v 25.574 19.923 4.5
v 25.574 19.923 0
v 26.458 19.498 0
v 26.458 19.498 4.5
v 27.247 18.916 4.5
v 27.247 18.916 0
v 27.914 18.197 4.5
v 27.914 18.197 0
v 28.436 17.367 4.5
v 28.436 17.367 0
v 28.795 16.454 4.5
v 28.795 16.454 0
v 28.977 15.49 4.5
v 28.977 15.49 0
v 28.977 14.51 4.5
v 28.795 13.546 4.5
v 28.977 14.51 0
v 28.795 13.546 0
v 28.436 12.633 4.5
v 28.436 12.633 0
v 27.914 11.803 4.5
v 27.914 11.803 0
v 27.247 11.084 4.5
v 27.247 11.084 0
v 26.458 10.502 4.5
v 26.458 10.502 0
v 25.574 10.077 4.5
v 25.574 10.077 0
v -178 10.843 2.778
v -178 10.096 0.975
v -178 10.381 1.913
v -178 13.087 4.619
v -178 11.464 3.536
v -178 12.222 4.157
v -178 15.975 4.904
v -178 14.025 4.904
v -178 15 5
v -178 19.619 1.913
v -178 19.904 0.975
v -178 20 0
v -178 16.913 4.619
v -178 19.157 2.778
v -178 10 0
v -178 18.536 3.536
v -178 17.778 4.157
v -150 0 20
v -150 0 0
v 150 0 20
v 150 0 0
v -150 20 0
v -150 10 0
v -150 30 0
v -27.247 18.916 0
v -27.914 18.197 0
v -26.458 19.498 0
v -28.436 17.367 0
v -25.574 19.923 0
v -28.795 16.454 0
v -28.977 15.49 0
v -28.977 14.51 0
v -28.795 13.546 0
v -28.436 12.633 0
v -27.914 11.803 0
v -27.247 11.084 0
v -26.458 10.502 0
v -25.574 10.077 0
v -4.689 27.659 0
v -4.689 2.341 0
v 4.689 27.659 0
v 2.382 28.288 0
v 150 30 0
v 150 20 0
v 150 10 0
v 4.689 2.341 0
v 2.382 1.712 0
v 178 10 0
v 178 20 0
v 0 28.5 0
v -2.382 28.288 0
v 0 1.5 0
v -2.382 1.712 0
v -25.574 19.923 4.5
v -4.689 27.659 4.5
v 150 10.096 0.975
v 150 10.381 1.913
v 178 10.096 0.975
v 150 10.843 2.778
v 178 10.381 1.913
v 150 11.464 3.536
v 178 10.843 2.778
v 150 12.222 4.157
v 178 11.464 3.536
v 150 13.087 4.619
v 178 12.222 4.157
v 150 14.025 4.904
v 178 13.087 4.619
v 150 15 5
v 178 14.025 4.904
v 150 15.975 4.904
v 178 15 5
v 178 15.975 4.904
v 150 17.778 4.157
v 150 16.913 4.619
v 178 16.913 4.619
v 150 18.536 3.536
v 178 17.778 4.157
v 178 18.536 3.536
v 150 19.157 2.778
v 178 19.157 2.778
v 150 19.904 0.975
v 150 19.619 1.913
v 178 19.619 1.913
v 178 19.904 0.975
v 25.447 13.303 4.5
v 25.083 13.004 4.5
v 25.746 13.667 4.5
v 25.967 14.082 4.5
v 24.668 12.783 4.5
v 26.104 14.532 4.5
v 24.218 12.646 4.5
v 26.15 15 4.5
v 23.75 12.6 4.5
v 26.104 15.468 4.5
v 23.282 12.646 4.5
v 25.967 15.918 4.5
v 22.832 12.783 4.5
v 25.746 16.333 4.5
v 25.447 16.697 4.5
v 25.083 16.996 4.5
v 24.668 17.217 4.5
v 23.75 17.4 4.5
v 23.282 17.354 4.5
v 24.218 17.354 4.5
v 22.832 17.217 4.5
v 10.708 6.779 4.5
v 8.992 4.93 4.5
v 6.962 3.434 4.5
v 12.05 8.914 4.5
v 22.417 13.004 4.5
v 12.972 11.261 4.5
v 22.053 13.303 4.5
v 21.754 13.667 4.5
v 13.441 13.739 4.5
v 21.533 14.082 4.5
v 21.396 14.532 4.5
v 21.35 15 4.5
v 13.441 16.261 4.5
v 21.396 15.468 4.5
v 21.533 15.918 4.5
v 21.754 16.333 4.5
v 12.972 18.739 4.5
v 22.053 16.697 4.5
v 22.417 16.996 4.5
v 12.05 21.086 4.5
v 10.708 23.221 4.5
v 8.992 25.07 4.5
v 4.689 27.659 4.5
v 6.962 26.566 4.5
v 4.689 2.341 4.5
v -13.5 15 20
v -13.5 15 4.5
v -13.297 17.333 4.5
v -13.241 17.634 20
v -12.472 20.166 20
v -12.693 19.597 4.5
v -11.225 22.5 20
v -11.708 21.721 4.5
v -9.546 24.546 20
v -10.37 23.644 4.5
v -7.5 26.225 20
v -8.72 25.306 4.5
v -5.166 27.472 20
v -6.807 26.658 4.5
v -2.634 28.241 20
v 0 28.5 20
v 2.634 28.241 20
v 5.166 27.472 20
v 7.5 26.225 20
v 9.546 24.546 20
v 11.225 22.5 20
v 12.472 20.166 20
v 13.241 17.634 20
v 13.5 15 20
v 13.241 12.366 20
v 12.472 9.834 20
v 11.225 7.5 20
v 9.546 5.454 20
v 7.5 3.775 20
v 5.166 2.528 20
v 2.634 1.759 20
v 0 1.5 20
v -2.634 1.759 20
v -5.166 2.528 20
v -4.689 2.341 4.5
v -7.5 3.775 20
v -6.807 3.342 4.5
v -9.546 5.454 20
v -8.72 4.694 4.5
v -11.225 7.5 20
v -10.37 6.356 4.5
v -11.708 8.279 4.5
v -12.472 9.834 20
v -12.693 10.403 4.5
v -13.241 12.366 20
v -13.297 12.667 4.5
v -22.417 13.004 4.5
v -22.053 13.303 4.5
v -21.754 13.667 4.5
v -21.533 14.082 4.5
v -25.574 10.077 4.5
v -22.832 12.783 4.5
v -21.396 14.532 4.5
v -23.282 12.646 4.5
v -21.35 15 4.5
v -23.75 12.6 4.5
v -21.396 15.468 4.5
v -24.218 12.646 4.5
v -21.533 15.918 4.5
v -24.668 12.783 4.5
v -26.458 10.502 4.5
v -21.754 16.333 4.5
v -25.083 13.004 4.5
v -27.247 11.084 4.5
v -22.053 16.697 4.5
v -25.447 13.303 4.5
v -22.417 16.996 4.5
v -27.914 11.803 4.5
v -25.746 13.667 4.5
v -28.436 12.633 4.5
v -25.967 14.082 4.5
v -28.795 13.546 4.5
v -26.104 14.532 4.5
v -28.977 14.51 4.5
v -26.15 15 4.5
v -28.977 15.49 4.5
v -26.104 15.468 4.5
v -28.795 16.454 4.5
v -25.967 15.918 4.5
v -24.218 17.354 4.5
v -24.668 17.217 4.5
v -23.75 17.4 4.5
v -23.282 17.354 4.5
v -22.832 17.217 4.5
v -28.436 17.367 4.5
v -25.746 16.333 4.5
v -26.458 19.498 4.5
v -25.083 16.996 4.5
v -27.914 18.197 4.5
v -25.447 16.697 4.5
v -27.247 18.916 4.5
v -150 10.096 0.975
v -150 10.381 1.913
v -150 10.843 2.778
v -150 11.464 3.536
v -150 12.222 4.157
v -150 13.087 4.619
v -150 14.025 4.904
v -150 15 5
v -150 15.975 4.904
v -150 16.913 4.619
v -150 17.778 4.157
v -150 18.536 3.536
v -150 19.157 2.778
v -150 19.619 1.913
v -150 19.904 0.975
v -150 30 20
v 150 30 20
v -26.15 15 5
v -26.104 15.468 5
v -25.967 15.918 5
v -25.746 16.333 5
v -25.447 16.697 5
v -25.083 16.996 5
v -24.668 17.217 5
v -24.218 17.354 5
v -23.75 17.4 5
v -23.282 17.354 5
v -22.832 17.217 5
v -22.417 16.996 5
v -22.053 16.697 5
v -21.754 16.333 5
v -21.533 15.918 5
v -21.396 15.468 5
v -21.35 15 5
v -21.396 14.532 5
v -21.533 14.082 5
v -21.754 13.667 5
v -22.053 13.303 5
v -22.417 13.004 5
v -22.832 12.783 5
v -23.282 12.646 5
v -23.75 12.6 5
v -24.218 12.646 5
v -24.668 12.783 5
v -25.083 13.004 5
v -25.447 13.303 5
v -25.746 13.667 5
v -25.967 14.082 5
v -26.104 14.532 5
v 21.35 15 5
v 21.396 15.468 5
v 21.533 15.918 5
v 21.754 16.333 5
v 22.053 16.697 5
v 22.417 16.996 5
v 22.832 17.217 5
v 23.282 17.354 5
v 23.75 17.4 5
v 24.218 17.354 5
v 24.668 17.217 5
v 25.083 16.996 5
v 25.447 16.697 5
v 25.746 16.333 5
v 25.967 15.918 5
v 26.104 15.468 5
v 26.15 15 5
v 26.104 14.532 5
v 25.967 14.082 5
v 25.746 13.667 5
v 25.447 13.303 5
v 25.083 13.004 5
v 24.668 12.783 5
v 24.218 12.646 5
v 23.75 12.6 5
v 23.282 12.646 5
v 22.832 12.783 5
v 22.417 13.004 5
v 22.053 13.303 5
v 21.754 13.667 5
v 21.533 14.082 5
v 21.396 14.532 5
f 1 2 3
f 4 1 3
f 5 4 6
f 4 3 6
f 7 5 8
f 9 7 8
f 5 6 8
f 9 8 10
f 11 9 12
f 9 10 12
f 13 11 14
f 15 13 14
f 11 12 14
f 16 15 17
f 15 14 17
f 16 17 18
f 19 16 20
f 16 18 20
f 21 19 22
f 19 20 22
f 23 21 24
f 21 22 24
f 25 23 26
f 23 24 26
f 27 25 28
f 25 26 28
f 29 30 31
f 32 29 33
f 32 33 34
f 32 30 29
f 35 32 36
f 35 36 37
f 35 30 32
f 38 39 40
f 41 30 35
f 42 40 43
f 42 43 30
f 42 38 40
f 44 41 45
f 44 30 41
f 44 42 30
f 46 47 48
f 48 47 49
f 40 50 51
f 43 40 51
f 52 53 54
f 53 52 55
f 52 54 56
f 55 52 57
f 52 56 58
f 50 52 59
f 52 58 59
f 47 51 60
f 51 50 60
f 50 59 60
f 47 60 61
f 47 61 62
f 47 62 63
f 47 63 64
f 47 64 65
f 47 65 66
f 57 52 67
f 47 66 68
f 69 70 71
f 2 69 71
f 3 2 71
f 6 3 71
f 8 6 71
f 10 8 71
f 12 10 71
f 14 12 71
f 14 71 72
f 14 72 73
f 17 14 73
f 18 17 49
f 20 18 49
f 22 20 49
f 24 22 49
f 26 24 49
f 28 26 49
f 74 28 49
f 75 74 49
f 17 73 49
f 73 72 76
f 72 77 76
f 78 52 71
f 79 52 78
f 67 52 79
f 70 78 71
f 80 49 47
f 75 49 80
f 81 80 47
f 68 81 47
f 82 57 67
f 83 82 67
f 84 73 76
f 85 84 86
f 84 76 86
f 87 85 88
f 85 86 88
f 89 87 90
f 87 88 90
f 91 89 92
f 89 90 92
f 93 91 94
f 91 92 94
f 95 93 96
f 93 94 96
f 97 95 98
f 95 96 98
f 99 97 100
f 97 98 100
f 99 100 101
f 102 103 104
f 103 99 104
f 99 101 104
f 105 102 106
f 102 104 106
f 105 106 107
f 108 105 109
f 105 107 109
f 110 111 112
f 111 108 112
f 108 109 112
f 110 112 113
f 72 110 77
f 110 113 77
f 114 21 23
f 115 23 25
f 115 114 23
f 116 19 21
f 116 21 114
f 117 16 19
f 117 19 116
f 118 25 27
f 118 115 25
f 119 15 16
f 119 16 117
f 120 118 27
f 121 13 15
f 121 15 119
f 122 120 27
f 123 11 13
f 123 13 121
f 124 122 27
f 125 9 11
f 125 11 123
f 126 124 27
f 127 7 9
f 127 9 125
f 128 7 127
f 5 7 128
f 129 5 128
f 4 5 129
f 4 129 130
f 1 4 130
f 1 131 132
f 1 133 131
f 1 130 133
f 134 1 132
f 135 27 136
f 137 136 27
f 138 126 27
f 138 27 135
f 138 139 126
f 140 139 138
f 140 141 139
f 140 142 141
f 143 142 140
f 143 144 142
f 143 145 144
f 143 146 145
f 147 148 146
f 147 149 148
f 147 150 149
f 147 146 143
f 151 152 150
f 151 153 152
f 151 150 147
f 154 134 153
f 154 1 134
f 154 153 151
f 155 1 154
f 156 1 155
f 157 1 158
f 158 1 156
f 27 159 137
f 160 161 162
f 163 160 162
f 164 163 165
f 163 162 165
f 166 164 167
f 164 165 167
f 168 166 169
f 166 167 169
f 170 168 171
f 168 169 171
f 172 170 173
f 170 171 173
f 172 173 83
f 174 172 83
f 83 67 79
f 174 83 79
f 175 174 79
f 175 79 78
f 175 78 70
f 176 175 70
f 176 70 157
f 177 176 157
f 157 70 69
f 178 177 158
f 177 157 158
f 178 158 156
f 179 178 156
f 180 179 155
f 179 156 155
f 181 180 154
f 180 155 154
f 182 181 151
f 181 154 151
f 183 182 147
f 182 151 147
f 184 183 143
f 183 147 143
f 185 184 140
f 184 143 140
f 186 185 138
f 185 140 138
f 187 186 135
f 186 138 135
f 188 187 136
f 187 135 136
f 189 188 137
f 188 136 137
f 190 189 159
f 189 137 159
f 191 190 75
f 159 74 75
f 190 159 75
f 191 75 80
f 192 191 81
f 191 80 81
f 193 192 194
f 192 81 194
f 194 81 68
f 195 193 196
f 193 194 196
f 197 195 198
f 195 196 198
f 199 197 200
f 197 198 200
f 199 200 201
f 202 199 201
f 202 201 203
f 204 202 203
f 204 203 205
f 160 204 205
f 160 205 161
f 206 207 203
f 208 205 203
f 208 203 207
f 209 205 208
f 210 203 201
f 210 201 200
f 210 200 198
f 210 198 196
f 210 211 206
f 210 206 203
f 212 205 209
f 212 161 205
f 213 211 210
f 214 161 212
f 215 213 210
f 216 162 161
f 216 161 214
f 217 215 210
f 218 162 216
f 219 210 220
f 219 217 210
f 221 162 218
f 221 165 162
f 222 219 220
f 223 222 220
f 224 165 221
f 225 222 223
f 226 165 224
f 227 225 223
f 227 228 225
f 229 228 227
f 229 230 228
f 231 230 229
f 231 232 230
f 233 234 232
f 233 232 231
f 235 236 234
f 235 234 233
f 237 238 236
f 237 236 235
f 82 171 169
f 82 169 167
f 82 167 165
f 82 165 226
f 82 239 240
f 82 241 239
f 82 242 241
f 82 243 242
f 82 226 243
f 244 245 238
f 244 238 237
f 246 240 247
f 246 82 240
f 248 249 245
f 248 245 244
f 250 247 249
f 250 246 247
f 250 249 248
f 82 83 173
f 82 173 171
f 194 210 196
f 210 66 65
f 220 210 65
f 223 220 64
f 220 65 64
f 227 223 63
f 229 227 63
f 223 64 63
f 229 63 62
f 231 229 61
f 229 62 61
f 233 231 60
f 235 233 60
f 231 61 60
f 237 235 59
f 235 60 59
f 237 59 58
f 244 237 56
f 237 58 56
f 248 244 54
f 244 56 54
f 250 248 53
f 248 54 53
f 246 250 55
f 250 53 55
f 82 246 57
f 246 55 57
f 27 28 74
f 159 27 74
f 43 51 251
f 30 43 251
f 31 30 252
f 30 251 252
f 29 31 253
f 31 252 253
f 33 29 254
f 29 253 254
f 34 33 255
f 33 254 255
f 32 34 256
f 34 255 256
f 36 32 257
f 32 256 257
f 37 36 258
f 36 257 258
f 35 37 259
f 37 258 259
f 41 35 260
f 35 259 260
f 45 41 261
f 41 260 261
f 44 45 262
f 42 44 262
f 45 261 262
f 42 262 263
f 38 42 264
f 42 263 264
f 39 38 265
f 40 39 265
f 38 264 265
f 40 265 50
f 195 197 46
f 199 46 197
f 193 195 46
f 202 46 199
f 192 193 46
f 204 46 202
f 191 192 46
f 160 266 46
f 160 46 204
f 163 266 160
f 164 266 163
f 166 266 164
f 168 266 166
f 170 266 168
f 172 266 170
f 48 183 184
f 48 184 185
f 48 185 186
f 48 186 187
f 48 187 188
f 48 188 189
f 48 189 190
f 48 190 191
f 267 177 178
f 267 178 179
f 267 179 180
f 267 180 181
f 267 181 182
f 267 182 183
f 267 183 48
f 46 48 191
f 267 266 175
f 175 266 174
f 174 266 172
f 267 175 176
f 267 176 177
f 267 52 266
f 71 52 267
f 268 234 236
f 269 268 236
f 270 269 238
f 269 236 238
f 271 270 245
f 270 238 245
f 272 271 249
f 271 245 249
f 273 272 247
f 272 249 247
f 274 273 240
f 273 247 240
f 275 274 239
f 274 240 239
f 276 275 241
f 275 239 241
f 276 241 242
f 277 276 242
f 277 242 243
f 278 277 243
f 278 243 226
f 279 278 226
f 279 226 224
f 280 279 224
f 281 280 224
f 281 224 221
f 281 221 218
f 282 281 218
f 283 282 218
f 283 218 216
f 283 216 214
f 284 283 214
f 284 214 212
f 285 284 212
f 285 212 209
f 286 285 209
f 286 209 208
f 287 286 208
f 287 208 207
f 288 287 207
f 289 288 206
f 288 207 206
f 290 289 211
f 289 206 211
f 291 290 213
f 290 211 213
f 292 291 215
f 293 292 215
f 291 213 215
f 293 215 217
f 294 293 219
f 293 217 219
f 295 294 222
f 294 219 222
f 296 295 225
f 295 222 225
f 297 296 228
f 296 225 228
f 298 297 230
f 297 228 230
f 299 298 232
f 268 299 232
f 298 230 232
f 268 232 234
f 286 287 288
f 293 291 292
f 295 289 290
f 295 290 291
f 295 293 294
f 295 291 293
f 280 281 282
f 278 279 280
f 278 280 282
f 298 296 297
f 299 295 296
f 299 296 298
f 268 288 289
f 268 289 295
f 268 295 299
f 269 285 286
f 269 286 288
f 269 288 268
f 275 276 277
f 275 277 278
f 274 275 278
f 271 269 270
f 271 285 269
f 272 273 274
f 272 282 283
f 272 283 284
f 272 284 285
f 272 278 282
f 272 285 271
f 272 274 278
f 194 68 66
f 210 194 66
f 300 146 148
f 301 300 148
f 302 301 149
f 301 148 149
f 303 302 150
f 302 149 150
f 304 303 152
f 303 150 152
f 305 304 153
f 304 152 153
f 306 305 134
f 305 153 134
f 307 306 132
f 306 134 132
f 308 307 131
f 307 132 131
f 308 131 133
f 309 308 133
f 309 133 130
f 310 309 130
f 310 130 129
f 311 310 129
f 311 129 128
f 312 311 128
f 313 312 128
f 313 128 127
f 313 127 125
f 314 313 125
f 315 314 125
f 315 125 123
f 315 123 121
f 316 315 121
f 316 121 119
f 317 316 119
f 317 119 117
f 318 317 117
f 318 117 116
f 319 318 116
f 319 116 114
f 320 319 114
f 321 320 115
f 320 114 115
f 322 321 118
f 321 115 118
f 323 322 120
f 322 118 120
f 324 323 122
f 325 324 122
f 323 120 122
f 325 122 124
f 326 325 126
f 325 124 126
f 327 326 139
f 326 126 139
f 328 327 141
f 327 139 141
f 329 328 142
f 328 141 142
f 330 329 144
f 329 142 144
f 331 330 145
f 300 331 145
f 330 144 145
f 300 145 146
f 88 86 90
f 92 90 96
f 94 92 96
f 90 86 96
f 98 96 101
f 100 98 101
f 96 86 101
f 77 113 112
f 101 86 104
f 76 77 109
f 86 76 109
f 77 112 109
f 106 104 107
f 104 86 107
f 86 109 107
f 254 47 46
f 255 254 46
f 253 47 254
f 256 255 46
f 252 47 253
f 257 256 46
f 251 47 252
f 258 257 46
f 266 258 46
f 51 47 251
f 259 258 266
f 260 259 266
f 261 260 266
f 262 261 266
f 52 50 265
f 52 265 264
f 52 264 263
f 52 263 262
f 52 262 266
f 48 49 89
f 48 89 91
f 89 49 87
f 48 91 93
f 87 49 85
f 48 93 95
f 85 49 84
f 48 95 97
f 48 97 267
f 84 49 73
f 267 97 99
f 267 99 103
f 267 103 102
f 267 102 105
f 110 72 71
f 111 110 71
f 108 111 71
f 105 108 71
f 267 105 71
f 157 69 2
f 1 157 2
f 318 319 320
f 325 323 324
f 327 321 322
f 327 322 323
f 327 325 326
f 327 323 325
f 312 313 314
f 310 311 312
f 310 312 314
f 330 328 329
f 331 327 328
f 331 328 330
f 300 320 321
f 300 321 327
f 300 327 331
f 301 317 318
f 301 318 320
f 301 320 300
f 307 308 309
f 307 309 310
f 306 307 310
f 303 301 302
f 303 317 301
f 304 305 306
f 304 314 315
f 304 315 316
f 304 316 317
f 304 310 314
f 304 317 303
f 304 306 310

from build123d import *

# Parameters (mm, degrees)
SKETCH_1_W           = 300
SKETCH_1_H           = 30
EXTRUDE_1_DEPTH      = 20
EXTRUDE_2_DEPTH      = 28
EXTRUDE_2_DEPTH_BACK = 328
SKETCH_3_R           = 13.5
CUT_EXTRUDE_2_DEPTH  = 182.614977356
SKETCH_3_4_R         = 2.4
CUT_EXTRUDE_3_DEPTH  = 4.5
SKETCH_3_5_R         = 2.4
CUT_EXTRUDE_4_DEPTH  = 5


with BuildPart() as part:
    # 草图1 → 凸台-拉伸1 (new body)
    with BuildSketch(Plane.XY):
        with Locations((0, 15)):
            Rectangle(SKETCH_1_W, SKETCH_1_H)
    extrude(amount=EXTRUDE_1_DEPTH)

    # 草图2 → 凸台-拉伸2 (add, two sides: drawn at the far end of the back side and taken through both)
    with BuildSketch(Plane.ZY.offset(150).offset(-EXTRUDE_2_DEPTH_BACK)):
        with BuildLine():
            Line((0, 20), (0, 10))
            ThreePointArc((0, 10), (5, 15), (0, 20))
        make_face()
    extrude(amount=EXTRUDE_2_DEPTH + EXTRUDE_2_DEPTH_BACK)

    # 草图3 → 切除-拉伸2 (cut, through all)
    with BuildSketch(Plane(origin=(0, 0, 0), x_dir=(-1, 0, 0), z_dir=(0, 0, -1))):
        with Locations((0, 15)):
            Circle(SKETCH_3_R)
    extrude(amount=-CUT_EXTRUDE_2_DEPTH, mode=Mode.SUBTRACT)

    # 草图3<4> → 切除-拉伸3 (cut)
    # profile 1 of 2: a face of its own
    with BuildSketch(Plane(origin=(0, 0, 0), x_dir=(-1, 0, 0), z_dir=(0, 0, -1))):
        with BuildLine():
            Line((25.573684211, 19.923075858), (4.689473684, 27.65933792))
            ThreePointArc((4.689473684, 27.65933792), (13.5, 15), (4.689473684, 2.34066208))
            Line((4.689473684, 2.34066208), (25.573684211, 10.076924142))
            ThreePointArc((25.573684211, 10.076924142), (29, 15), (25.573684211, 19.923075858))
        make_face()
        with Locations((23.75, 15)):
            Circle(SKETCH_3_4_R, mode=Mode.SUBTRACT)
    # profile 2 of 2: a face of its own
    with BuildSketch(Plane(origin=(0, 0, 0), x_dir=(-1, 0, 0), z_dir=(0, 0, -1))):
        with BuildLine():
            ThreePointArc((-4.689473684, 2.34066208), (-13.5, 15), (-4.689473684, 27.65933792))
            Line((-4.689473684, 27.65933792), (-25.573684211, 19.923075858))
            ThreePointArc((-25.573684211, 19.923075858), (-29, 15), (-25.573684211, 10.076924142))
            Line((-25.573684211, 10.076924142), (-4.689473684, 2.34066208))
        make_face()
        with Locations((-23.75, 15)):
            Circle(SKETCH_3_4_R, mode=Mode.SUBTRACT)
    extrude(amount=-CUT_EXTRUDE_3_DEPTH, mode=Mode.SUBTRACT)

    # 草图3<5> → 切除-拉伸4 (cut)
    with BuildSketch(Plane(origin=(0, 0, 0), x_dir=(-1, 0, 0), z_dir=(0, 0, -1))):
        with Locations((-23.75, 15)):
            Circle(SKETCH_3_5_R)
        with Locations((23.75, 15)):
            Circle(SKETCH_3_5_R)
    extrude(amount=-CUT_EXTRUDE_4_DEPTH, mode=Mode.SUBTRACT)


solid = part.part
